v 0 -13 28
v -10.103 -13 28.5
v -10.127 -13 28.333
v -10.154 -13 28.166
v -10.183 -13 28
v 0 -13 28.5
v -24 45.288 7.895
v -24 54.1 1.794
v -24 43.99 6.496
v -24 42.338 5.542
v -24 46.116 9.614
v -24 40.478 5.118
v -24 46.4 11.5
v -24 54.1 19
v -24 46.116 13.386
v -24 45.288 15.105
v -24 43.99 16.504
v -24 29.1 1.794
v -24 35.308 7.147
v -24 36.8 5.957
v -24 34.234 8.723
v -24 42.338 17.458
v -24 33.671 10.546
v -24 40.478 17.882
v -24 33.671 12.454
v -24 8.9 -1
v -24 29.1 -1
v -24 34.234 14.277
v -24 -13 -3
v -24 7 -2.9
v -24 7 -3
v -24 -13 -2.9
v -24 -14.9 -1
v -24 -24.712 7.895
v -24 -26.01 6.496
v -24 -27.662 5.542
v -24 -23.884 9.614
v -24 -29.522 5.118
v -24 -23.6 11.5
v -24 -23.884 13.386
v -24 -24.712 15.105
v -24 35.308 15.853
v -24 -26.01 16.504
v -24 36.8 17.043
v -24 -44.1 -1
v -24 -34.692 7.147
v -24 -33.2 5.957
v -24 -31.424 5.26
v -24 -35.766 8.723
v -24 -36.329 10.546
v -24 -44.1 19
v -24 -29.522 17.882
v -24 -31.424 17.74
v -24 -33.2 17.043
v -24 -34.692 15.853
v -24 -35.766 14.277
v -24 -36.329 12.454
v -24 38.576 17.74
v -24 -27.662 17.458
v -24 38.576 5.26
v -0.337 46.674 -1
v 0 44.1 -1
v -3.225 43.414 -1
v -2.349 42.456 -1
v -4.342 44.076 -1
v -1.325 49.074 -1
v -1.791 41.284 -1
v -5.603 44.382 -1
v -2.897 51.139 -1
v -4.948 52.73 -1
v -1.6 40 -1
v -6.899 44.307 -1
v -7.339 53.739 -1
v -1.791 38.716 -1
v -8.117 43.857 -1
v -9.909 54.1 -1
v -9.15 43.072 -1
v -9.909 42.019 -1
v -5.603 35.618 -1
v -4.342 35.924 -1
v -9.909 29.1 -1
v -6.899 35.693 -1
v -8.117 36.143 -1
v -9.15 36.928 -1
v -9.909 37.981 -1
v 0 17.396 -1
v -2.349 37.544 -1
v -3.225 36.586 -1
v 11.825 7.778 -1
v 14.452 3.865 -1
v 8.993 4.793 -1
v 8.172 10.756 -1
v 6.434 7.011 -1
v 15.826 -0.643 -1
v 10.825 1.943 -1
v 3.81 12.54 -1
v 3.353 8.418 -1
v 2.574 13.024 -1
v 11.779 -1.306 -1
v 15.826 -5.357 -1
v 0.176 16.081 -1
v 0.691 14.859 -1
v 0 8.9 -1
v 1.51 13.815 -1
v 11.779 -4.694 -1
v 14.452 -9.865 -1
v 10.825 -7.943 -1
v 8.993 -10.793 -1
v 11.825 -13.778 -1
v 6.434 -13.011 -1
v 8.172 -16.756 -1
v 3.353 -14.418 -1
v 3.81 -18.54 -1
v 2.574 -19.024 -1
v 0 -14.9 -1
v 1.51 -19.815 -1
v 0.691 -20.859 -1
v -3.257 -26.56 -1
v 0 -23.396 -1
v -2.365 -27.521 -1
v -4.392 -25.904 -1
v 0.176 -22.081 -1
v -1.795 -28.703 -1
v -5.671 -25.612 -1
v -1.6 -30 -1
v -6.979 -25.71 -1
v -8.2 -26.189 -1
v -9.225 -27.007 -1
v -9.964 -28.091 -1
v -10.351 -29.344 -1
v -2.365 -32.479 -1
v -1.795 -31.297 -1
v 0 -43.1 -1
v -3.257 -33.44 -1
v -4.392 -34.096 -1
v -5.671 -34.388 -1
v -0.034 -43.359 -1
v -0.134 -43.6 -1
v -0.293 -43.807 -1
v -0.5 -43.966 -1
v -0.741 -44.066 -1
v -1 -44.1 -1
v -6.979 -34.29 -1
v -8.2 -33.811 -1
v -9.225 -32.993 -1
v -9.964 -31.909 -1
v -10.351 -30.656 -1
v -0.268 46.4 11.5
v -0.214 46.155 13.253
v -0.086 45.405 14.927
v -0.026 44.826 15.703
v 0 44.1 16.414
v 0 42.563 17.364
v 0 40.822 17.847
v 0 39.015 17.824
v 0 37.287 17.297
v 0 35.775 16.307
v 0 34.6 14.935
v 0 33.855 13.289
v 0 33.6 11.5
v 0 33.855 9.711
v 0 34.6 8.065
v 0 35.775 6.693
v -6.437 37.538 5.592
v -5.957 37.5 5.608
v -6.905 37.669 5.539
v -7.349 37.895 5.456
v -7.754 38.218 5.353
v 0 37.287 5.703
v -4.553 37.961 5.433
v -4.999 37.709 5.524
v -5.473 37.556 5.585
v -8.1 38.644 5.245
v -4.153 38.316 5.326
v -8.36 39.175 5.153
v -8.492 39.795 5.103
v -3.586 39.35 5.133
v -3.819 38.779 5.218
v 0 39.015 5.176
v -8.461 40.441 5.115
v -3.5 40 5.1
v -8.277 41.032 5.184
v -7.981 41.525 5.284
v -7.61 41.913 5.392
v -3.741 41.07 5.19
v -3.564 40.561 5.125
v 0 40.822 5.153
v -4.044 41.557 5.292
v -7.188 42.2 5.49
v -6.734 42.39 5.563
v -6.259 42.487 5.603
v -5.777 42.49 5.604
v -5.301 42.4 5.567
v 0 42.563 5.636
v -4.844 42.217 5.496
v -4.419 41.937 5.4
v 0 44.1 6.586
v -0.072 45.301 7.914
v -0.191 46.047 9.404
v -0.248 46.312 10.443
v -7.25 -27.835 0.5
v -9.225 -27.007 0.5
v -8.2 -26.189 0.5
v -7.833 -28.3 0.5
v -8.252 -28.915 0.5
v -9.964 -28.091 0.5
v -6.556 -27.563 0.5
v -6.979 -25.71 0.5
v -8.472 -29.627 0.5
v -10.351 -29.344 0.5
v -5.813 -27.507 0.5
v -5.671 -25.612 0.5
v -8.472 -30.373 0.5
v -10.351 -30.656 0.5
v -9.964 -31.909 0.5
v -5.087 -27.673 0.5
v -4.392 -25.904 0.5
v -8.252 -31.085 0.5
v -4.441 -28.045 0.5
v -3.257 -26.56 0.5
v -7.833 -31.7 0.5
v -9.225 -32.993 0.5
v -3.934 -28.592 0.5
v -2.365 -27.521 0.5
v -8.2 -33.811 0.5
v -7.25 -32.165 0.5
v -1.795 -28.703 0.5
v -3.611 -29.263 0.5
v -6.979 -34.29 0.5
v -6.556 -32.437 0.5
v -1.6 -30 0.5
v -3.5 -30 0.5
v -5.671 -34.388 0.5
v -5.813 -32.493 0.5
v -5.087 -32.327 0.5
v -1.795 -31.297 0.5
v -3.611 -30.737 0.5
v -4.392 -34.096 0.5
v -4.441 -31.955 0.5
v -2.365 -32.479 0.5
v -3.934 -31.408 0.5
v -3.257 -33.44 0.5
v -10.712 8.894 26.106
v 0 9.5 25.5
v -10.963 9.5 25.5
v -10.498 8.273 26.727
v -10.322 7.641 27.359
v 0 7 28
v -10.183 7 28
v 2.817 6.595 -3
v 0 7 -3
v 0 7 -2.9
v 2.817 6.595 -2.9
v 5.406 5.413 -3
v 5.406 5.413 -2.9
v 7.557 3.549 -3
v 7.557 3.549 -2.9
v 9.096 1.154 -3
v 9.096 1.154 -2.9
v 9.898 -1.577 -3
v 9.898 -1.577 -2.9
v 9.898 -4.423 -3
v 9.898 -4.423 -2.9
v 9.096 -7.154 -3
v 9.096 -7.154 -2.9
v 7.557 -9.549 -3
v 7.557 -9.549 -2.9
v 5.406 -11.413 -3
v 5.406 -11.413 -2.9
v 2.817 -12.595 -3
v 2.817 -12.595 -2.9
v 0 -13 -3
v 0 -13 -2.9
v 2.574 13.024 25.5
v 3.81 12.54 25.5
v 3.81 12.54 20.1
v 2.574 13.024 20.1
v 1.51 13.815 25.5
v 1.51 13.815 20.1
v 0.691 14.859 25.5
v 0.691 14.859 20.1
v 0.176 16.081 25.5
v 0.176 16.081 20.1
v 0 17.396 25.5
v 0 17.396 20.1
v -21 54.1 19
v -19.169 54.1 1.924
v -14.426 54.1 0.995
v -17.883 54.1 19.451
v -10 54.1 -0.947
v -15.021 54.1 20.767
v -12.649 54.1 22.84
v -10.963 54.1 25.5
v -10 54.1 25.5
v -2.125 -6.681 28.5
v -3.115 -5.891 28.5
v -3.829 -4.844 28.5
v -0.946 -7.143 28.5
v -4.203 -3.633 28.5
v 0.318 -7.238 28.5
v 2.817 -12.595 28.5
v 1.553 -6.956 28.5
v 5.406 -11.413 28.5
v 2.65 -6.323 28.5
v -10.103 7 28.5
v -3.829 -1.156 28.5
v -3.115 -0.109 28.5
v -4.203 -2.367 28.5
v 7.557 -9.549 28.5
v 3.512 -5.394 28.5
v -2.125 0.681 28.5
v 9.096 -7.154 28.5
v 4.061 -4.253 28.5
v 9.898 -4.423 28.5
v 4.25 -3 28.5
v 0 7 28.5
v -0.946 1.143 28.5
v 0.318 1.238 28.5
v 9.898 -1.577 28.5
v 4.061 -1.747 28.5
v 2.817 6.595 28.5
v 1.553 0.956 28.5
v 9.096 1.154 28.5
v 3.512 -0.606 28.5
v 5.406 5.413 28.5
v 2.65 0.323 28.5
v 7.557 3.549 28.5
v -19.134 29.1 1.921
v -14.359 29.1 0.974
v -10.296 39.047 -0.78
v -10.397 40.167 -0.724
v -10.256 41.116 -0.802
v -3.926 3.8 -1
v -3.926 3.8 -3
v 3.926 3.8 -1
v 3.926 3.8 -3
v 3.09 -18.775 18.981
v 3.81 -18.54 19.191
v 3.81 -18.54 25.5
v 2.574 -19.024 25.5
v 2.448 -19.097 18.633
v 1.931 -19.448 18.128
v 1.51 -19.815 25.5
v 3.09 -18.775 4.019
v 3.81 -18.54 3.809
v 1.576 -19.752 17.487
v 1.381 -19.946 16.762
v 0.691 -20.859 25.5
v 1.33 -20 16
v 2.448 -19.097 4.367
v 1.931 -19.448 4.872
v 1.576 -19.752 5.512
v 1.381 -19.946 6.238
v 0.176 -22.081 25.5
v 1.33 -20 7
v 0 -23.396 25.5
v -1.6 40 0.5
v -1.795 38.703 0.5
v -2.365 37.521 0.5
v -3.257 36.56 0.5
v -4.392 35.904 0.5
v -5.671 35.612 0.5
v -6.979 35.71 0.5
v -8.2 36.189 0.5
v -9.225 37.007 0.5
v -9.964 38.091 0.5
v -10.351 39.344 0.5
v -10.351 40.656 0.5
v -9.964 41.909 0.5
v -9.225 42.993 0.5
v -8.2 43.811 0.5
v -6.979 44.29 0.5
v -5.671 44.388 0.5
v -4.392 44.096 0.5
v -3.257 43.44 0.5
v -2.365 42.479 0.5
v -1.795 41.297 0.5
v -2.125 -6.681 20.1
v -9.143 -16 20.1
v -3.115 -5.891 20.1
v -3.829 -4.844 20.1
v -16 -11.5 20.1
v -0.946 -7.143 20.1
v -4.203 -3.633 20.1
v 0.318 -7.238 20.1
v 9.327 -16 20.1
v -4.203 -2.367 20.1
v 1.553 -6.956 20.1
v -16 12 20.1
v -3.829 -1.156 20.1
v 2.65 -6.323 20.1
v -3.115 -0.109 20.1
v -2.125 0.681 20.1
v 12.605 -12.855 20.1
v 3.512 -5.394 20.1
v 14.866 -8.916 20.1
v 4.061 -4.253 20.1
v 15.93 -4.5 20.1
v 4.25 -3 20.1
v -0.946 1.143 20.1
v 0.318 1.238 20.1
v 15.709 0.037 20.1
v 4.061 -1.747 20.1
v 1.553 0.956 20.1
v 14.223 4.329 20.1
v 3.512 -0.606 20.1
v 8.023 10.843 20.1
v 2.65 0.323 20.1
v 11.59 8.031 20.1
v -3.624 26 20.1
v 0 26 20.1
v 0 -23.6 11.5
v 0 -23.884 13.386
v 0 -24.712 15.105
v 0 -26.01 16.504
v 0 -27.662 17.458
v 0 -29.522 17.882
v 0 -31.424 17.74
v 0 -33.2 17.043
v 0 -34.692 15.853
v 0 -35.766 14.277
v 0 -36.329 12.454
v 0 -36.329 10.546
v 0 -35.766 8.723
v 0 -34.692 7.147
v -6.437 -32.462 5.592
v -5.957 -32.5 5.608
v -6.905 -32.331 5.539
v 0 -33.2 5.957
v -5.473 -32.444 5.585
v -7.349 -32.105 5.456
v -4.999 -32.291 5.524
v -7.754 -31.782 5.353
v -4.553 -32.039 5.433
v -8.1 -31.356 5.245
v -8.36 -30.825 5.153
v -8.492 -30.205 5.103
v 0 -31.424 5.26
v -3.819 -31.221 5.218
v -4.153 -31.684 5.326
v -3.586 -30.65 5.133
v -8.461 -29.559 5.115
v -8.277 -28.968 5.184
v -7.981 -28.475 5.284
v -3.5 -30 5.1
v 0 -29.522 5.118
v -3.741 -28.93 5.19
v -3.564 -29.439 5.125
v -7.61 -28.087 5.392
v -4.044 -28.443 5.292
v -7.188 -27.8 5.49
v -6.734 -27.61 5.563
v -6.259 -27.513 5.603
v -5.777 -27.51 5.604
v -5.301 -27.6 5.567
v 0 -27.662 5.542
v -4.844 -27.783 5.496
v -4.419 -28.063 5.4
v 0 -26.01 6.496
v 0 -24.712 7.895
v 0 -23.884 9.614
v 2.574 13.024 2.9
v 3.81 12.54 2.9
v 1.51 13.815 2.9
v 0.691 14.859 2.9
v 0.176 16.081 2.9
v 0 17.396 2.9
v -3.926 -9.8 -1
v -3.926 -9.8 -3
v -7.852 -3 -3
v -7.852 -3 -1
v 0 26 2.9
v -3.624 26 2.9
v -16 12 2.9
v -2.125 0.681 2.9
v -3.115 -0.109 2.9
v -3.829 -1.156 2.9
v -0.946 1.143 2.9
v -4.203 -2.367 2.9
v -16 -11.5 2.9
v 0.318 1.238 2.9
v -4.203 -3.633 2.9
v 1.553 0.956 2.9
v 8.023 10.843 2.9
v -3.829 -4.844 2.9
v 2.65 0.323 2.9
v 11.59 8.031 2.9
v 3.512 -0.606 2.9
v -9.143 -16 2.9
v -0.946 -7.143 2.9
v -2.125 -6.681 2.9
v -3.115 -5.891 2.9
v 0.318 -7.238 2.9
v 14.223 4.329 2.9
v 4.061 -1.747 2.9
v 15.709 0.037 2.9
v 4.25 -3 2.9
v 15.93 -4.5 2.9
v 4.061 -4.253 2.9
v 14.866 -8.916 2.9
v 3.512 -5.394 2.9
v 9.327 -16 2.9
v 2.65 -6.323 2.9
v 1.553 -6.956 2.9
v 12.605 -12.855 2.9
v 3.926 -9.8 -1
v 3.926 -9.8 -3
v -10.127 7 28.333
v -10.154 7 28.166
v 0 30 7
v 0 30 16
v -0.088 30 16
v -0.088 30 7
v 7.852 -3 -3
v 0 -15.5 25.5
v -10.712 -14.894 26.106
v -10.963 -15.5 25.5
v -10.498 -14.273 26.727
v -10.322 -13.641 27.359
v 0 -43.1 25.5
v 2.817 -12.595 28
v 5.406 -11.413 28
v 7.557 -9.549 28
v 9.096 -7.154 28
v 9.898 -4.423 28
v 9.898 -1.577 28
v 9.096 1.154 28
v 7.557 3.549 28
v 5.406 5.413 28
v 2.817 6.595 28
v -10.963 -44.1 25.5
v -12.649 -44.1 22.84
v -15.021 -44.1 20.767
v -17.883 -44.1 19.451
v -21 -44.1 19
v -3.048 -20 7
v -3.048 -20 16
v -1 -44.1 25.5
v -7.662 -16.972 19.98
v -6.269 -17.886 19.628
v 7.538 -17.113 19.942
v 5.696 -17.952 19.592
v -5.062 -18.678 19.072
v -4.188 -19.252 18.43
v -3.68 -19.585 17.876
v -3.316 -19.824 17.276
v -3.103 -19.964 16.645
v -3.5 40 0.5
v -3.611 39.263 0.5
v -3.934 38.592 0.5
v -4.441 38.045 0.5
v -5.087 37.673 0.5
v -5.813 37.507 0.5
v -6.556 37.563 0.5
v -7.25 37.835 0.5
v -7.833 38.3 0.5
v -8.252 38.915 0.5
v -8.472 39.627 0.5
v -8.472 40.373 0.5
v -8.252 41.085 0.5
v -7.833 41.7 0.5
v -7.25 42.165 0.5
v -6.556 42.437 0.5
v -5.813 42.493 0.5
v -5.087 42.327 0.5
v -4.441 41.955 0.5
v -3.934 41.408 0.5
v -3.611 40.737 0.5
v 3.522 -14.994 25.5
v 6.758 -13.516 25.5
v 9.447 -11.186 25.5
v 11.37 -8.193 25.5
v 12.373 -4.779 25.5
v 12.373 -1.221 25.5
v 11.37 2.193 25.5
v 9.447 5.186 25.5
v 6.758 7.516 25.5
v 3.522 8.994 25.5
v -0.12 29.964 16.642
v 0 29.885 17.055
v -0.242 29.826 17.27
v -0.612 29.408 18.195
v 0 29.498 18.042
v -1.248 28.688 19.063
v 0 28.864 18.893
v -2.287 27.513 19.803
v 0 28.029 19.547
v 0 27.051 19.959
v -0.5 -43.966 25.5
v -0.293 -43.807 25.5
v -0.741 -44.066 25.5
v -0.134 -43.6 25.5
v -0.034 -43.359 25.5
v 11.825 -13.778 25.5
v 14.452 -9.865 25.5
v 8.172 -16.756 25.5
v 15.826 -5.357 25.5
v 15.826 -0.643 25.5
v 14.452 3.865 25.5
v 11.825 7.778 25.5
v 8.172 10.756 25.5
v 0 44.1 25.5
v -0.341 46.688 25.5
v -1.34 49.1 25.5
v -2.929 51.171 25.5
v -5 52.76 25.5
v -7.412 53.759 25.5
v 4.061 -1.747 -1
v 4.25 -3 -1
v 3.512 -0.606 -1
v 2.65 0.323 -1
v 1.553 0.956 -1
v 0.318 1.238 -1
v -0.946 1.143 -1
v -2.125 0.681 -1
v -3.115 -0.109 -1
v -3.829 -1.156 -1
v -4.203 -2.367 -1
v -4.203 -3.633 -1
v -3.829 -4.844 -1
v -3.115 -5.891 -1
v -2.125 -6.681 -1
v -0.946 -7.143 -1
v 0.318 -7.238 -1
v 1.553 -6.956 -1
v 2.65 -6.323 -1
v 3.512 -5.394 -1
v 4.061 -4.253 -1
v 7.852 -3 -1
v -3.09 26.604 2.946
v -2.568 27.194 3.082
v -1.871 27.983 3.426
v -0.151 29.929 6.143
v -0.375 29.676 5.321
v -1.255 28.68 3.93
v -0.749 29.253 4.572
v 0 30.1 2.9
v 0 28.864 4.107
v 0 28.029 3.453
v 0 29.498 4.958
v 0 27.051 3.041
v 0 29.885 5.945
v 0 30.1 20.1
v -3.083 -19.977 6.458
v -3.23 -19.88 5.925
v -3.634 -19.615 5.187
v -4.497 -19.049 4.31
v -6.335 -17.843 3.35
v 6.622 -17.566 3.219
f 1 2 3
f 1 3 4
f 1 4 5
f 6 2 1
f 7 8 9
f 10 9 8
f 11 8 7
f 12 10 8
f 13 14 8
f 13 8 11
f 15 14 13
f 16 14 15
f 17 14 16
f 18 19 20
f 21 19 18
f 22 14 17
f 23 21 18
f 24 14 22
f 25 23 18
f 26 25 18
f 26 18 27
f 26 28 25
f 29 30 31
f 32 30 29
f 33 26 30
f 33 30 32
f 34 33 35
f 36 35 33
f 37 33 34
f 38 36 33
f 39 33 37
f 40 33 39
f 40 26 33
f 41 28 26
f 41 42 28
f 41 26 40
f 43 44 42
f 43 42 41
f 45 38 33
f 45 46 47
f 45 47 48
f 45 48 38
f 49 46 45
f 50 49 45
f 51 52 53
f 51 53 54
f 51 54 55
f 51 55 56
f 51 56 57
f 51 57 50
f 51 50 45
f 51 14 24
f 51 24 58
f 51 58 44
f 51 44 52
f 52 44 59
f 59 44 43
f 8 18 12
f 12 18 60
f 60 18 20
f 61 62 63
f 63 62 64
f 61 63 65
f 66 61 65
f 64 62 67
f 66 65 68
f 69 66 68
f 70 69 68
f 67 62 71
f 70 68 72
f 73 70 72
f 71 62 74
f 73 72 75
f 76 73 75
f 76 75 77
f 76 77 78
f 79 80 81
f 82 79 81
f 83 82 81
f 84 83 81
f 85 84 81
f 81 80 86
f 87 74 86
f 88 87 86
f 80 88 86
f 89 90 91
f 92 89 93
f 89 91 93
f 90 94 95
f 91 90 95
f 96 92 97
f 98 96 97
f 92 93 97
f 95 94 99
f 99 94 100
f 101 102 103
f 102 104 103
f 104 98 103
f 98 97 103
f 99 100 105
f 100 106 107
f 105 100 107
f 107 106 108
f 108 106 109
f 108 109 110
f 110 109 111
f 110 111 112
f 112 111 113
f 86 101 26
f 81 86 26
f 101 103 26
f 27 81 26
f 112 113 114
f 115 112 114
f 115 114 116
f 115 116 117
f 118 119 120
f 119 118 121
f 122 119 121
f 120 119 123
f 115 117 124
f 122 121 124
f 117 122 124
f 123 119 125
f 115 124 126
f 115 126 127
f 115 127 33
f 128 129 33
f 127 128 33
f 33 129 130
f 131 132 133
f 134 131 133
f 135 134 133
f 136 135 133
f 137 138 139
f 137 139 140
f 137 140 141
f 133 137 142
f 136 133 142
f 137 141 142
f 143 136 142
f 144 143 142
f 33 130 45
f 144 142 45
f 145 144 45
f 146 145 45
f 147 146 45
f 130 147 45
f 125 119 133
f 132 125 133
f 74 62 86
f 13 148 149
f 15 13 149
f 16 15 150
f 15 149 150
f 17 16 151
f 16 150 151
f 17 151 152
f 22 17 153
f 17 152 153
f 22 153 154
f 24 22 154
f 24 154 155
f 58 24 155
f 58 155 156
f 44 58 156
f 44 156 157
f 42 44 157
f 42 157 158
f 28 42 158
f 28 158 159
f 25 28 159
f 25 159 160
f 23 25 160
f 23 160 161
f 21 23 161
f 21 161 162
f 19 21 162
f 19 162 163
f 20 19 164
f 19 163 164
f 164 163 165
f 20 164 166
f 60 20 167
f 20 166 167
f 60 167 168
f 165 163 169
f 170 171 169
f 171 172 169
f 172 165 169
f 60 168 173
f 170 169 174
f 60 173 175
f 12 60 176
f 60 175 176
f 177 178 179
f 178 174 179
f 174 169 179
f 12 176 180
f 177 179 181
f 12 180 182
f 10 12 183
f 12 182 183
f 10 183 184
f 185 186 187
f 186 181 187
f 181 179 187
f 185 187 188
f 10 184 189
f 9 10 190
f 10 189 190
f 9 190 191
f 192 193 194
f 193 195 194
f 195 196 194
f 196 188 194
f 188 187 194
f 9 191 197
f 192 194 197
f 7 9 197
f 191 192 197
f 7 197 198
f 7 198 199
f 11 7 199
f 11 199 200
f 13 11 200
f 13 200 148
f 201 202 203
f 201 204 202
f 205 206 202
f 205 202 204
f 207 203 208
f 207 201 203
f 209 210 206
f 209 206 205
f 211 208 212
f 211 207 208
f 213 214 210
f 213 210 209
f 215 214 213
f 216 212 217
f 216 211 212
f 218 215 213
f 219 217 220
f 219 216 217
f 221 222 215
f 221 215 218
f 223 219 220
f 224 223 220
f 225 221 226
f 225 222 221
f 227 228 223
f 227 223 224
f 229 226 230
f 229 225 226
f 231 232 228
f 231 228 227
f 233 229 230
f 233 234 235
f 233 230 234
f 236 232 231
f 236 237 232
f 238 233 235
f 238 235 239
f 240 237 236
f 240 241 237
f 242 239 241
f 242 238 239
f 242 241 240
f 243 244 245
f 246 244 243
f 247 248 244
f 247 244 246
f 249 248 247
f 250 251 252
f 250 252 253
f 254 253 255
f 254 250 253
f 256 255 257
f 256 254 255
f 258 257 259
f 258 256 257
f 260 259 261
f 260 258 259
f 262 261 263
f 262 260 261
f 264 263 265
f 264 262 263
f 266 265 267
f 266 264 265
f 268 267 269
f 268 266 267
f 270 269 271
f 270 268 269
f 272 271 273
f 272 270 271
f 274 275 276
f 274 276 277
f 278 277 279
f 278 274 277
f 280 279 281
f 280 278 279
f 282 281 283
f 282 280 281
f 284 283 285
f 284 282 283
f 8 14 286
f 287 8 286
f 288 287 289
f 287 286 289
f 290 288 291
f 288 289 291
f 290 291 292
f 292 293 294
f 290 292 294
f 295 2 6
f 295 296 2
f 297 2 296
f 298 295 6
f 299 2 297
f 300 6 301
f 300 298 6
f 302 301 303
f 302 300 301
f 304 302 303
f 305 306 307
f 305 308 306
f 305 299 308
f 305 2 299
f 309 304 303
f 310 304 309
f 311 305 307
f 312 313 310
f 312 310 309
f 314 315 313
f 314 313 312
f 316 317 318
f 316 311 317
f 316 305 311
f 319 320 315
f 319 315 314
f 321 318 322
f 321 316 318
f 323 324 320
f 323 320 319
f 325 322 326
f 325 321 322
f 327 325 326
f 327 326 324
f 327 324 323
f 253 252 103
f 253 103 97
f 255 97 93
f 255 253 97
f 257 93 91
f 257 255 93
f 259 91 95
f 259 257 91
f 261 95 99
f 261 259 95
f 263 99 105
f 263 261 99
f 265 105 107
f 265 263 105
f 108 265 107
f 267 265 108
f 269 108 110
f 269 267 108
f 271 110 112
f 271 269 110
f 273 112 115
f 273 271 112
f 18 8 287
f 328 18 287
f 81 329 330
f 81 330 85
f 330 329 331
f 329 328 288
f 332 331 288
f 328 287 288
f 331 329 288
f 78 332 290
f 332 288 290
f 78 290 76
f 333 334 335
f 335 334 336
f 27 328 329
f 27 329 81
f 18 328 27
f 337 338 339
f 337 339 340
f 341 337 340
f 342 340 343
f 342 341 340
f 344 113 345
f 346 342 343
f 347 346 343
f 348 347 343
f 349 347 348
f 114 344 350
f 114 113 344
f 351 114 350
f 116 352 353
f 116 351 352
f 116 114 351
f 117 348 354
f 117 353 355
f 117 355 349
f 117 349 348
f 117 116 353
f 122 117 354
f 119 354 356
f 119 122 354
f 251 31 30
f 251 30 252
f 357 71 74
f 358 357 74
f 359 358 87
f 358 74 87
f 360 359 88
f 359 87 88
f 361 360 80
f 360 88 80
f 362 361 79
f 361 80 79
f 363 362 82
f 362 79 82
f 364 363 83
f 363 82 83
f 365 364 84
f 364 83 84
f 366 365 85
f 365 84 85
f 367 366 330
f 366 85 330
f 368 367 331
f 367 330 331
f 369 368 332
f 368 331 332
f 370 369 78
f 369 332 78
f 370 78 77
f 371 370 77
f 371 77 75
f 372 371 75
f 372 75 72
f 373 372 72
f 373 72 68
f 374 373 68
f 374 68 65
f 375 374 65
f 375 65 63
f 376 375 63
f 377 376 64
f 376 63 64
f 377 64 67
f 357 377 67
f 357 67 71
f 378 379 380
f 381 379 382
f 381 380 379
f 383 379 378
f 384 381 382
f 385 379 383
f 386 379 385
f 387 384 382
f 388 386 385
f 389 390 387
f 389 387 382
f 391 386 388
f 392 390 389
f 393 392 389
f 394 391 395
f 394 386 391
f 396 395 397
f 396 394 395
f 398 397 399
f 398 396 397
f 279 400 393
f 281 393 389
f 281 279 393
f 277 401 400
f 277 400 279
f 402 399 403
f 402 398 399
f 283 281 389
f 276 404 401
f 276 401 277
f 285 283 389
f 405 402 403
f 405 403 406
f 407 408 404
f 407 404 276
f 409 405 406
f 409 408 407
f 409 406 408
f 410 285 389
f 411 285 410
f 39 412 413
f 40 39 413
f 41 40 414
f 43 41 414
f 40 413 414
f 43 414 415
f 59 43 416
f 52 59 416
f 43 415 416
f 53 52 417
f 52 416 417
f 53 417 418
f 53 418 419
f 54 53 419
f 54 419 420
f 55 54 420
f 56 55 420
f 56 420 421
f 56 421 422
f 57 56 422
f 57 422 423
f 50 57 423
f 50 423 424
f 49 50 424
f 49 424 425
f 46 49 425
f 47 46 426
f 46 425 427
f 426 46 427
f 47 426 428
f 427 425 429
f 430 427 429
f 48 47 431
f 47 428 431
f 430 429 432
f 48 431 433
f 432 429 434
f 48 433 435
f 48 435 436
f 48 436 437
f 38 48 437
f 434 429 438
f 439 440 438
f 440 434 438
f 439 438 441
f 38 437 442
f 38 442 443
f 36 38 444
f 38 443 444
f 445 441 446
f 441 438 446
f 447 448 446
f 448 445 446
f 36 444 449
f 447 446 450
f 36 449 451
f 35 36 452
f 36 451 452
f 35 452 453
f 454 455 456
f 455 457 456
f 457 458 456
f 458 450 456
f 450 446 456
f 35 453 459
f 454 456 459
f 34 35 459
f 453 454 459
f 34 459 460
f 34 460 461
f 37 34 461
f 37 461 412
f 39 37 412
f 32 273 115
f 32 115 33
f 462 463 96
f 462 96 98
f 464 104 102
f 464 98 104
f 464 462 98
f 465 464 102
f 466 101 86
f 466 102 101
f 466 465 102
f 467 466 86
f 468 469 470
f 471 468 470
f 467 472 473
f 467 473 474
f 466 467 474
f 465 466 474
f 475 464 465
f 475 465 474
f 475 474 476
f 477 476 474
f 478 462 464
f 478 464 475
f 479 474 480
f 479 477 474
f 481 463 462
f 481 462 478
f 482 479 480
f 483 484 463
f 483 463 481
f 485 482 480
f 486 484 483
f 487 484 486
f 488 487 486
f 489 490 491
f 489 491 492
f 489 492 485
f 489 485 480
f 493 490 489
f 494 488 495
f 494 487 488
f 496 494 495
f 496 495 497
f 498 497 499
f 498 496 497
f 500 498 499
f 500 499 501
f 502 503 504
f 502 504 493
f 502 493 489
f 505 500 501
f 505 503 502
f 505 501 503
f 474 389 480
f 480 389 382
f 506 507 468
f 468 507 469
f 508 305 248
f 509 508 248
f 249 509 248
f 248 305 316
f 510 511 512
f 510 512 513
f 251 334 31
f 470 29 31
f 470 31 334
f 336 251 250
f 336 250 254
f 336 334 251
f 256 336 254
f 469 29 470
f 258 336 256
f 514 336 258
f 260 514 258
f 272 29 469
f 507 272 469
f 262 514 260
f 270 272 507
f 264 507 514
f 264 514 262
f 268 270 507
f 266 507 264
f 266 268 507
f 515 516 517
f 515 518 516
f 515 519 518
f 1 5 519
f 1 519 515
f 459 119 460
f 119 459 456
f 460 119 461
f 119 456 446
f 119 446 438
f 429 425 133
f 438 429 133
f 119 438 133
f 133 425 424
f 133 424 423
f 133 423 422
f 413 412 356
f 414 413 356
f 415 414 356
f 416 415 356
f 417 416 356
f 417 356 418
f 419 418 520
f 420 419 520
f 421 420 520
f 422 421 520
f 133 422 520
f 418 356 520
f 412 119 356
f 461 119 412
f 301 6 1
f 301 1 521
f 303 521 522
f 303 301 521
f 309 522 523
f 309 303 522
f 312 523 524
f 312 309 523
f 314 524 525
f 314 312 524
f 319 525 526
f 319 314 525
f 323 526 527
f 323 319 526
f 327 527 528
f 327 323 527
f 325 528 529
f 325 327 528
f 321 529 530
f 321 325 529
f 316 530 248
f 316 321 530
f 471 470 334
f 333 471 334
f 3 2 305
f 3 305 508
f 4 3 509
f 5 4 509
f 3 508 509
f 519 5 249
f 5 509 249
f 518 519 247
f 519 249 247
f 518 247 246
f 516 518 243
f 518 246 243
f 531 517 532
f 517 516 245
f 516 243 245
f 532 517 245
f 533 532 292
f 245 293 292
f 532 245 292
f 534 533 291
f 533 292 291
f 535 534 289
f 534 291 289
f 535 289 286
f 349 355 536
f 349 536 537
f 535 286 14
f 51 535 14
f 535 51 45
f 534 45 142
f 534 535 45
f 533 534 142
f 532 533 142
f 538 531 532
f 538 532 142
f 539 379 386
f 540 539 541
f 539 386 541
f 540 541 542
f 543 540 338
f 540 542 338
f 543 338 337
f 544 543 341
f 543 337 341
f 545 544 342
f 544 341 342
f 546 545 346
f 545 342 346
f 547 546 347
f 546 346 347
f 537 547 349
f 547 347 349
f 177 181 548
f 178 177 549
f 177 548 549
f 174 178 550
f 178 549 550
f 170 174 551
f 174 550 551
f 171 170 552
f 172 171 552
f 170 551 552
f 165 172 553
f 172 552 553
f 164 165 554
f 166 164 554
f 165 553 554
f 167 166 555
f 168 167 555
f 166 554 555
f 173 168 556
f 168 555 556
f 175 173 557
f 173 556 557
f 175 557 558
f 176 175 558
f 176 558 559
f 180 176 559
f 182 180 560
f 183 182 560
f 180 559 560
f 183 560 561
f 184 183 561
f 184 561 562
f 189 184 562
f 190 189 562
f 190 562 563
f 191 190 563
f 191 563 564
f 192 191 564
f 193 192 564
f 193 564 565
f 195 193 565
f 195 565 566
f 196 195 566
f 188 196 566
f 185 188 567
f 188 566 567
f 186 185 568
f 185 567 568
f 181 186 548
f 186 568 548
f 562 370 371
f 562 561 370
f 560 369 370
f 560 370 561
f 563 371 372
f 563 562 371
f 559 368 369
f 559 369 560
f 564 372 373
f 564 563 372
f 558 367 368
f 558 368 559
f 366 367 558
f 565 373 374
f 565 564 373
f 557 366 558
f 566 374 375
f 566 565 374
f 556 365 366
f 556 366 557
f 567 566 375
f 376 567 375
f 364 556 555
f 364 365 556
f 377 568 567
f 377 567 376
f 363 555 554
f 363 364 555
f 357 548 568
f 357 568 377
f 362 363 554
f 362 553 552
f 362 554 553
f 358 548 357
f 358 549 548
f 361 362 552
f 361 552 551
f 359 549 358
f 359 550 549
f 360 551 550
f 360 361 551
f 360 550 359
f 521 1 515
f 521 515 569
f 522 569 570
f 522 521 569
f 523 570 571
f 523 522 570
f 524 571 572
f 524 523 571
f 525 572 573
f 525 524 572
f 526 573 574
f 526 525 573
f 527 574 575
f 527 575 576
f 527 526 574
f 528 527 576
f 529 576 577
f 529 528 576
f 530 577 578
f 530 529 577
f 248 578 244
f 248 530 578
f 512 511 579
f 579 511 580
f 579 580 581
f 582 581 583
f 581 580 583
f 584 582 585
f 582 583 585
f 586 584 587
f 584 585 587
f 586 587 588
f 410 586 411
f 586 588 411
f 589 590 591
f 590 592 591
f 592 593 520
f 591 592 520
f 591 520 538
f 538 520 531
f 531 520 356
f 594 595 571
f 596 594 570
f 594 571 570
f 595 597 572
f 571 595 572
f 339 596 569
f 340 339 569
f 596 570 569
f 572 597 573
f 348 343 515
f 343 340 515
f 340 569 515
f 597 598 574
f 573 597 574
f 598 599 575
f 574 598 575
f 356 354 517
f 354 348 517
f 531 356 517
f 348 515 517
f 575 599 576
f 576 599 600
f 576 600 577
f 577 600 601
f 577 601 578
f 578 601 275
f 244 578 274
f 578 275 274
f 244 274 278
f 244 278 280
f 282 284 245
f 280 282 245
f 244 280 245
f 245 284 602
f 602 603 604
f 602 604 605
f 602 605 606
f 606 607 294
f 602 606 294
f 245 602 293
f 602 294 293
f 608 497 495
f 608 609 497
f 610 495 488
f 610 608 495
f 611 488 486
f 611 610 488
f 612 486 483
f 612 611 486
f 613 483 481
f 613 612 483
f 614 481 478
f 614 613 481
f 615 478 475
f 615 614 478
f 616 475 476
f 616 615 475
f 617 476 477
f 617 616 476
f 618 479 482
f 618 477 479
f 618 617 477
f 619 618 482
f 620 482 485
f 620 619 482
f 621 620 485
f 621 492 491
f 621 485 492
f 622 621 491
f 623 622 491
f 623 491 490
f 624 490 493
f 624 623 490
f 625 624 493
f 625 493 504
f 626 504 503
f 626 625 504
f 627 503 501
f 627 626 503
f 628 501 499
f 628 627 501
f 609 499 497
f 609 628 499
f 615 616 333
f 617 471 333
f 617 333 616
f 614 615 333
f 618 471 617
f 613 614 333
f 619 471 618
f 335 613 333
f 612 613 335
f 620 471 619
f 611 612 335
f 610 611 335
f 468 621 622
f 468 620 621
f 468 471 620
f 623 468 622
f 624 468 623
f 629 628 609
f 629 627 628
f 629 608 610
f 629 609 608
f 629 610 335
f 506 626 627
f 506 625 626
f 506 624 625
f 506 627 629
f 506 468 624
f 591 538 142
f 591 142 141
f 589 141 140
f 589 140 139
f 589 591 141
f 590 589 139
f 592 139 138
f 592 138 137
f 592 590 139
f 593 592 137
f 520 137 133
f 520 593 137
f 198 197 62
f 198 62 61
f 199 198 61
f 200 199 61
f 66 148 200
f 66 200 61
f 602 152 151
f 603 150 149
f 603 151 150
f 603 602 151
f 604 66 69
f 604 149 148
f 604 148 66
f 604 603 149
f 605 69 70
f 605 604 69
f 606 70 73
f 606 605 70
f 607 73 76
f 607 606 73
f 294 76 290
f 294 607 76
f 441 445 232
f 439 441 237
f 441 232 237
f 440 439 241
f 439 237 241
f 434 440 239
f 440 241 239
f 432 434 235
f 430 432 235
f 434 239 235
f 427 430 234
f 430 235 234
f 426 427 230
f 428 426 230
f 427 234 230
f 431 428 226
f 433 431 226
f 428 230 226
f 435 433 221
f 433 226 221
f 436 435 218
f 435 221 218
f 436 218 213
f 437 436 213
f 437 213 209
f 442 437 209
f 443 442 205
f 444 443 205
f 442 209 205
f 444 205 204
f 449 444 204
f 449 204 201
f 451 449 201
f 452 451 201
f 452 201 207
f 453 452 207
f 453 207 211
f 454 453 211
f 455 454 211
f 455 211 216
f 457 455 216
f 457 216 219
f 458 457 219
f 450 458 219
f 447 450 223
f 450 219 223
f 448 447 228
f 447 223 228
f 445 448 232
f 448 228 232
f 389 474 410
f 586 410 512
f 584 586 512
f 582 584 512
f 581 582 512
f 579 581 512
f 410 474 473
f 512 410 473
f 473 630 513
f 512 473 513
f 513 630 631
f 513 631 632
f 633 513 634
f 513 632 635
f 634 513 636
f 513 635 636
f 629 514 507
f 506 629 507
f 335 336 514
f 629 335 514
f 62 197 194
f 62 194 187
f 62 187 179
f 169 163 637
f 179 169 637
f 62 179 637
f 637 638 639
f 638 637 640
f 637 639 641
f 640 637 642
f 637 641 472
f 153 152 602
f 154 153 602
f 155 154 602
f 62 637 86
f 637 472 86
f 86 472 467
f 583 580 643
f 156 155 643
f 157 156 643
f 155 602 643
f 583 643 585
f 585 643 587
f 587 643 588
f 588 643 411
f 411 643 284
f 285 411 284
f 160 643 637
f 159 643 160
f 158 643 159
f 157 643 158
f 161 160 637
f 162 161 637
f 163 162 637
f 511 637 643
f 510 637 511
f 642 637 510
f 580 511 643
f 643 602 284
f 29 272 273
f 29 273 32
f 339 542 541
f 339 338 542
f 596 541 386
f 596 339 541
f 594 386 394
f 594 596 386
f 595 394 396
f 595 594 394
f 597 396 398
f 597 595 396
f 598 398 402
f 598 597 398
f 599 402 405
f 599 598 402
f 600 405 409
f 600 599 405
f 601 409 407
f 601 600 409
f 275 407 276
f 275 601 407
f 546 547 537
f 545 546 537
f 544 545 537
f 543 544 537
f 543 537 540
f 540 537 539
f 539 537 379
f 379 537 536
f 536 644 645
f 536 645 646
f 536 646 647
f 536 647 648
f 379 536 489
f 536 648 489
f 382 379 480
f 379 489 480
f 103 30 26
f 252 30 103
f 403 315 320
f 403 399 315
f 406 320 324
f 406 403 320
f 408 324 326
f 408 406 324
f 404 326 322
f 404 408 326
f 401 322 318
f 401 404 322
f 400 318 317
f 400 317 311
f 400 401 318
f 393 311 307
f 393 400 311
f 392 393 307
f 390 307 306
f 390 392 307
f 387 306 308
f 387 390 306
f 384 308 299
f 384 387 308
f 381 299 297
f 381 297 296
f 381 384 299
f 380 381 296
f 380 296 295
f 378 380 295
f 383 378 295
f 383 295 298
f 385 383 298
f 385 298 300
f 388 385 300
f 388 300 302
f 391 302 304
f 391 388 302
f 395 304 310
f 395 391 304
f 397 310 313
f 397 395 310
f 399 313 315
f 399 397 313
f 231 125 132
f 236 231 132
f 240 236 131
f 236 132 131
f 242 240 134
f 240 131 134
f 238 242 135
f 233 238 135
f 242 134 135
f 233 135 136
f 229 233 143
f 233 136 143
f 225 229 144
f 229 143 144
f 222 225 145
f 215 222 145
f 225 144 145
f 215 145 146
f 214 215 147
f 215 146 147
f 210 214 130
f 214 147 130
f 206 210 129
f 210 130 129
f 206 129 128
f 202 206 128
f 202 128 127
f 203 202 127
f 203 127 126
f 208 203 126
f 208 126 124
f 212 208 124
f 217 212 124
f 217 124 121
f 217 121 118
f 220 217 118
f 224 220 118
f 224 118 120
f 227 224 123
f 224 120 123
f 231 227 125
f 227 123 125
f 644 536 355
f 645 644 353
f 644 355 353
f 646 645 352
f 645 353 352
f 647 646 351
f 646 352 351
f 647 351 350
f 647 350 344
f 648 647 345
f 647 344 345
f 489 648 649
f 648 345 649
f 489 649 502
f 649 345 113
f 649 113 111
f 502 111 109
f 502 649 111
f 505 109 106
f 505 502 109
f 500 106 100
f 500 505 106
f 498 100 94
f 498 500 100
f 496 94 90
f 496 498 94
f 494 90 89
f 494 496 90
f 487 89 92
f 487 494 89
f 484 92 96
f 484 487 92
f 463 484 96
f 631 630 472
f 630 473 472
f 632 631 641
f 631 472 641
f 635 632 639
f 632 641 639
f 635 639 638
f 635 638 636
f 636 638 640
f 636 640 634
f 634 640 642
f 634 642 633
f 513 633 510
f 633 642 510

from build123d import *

# Parameters (mm, degrees)
SKETCH_R          = 4.25
PAD_DEPTH         = 28.5
PAD_DEPTH_BACK    = 5
FILLET_R          = 5
SKETCH002_R       = 6.4
POCKET_DEPTH      = 24.001
POCKET_DEPTH_BACK = -16.001
POCKET001_DEPTH   = 3
POCKET002_DEPTH   = 4
POCKET003_DEPTH   = 98.201
POCKET004_DEPTH   = 4
POCKET005_DEPTH   = 16
SKETCH028_R       = 22
POCKET006_DEPTH   = 25
SKETCH031_R       = 2.5
POCKET007_DEPTH   = 9
PAD001_DEPTH      = 17.2
SKETCH034_W       = 50
SKETCH034_H       = 25
POCKET008_DEPTH   = 2
SKETCH036_R       = 4.4
POCKET009_DEPTH   = 1.5
CHAMFER_SIZE      = 1.9
CHAMFER001_SIZE   = 2.5


with BuildPart() as part:
    # Sketch → Pad (new body, two sides)
    with BuildSketch(Plane.XY) as pad_sk:
        with BuildLine():
            ThreePointArc((0, -19), (16, -3), (0, 13))
            Line((0, 44.1), (0, 13))
            ThreePointArc((0, 44.1), (-2.928932, 51.171068), (-10, 54.1))
            Line((-24, 54.1), (-10, 54.1))
            Line((-24, 54.1), (-24, -44.1))
            Line((-24, -44.1), (-1, -44.1))
            ThreePointArc((-1, -44.1), (-0.292893, -43.807107), (0, -43.1))
            Line((0, -19), (0, -43.1))
        make_face()
        with Locations((0, -3)):
            Circle(SKETCH_R, mode=Mode.SUBTRACT)
    extrude(amount=PAD_DEPTH)
    extrude(pad_sk.sketch, amount=-PAD_DEPTH_BACK)

    # Fillet
    fillet_edges = [part.edges().sort_by_distance(p)[0] for p in [
        (0, 13, 11.75),
        (0, -19, 11.75),
    ]]
    fillet(fillet_edges, radius=FILLET_R)

    # Sketch002 → Pocket (cut, two sides)
    with BuildSketch(Plane.YZ) as pocket_sk:
        with Locations((-30, 11.5)):
            Circle(SKETCH002_R)
        with Locations((40, 11.5)):
            Circle(SKETCH002_R)
    extrude(amount=-POCKET_DEPTH, mode=Mode.SUBTRACT)
    extrude(pocket_sk.sketch, amount=-POCKET_DEPTH_BACK, mode=Mode.SUBTRACT)

    # Sketch013 → Pocket001 (cut)
    with BuildSketch(Plane.XY.offset(28.5)):
        with BuildLine():
            ThreePointArc((0, -13), (10, -3), (0, 7))
            Line((-40, 7), (0, 7))
            Line((-40, 7), (-40, 60))
            Line((-40, 60), (30, 60))
            Line((30, 60), (30, -60))
            Line((30, -60), (-40, -60))
            Line((-40, -60), (-40, -13))
            Line((-40, -13), (0, -13))
        make_face()
    extrude(amount=-POCKET001_DEPTH, mode=Mode.SUBTRACT)

    # Sketch024 → Pocket002 (cut)
    with BuildSketch(Plane(origin=(0, 0, -5), x_dir=(1, 0, 0), z_dir=(0, 0, -1))):
        with BuildLine():
            Line((0, 13), (-40, 13))
            Line((-40, 13), (-40, 65))
            Line((-40, 65), (24, 65))
            Line((24, 65), (24, -65))
            Line((24, -65), (-40, -65))
            Line((-40, -7), (-40, -65))
            Line((-40, -7), (0, -7))
            ThreePointArc((0, -7), (10, 3), (0, 13))
        make_face()
    extrude(amount=-POCKET002_DEPTH, mode=Mode.SUBTRACT)

    # Sketch029 → Pocket003 (cut, through all)
    with BuildSketch(Plane(origin=(0, 54.1, 0), x_dir=(-1, 0, 0), z_dir=(0, 1, 0))):
        with BuildLine():
            ThreePointArc((32, 30), (13.221825, 37.778175), (21, 19))
            Line((21, 19), (32, 19))
            Line((32, 30), (32, 19))
        make_face()
    extrude(amount=-POCKET003_DEPTH, mode=Mode.SUBTRACT)

    # Sketch027 → Pocket004 (cut)
    with BuildSketch(Plane(origin=(0, 0, -5), x_dir=(1, 0, 0), z_dir=(0, 0, -1))):
        Polygon((3.925982, 9.8), (-3.925982, 9.8), (-7.851964, 3), (-3.925982, -3.8), (3.925982, -3.8), (7.851964, 3), align=None)
    extrude(amount=-POCKET004_DEPTH, mode=Mode.SUBTRACT)

    # Sketch025 → Pocket005 (cut, symmetric)
    with BuildSketch(Plane.YZ):
        with BuildLine():
            Line((-16, 20.1), (26, 20.1))
            ThreePointArc((30, 16), (28.864001, 18.892928), (26, 20.1))
            Line((30, 16), (30, 7))
            ThreePointArc((26, 2.9), (28.864001, 4.107072), (30, 7))
            Line((26, 2.9), (-16, 2.9))
            ThreePointArc((-20, 7), (-18.864001, 4.107072), (-16, 2.9))
            Line((-20, 7), (-20, 16))
            ThreePointArc((-16, 20.1), (-18.864001, 18.892928), (-20, 16))
        make_face()
    extrude(amount=POCKET005_DEPTH, both=True, mode=Mode.SUBTRACT)

    # Sketch028 → Pocket006 (cut)
    with BuildSketch(Plane(origin=(0, 54.1, 0), x_dir=(-1, 0, 0), z_dir=(0, 1, 0))):
        with Locations((21, -20)):
            Circle(SKETCH028_R)
    extrude(amount=-POCKET006_DEPTH, mode=Mode.SUBTRACT)

    # Sketch031 → Pocket007 (cut)
    with BuildSketch(Plane(origin=(0, 0, -1), x_dir=(1, 0, 0), z_dir=(0, 0, -1))):
        with Locations((-6, 30)):
            Circle(SKETCH031_R)
        with Locations((-6, -40)):
            Circle(SKETCH031_R)
    extrude(amount=-POCKET007_DEPTH, mode=Mode.SUBTRACT)

    # Sketch032 → Pad001 (new body)
    with BuildSketch(Plane.XY.offset(2.9)):
        Polygon((0, -22), (-16, -11.5), (-16, -22), align=None)
        Polygon((-16, 12), (0, 30.1), (-16, 30.1), align=None)
    extrude(amount=PAD001_DEPTH)

    # Sketch034 → Pocket008 (cut)
    with BuildSketch(Plane(origin=(0, 0, -5), x_dir=(1, 0, 0), z_dir=(0, 0, -1))):
        with Locations((-10, 2.5)):
            Rectangle(SKETCH034_W, SKETCH034_H)
    extrude(amount=-POCKET008_DEPTH, mode=Mode.SUBTRACT)

    # Sketch036 → Pocket009 (cut)
    with BuildSketch(Plane(origin=(0, 0, -1), x_dir=(1, 0, 0), z_dir=(0, 0, -1))):
        with Locations((-6, 30)):
            Circle(SKETCH036_R)
        with Locations((-6, -40)):
            Circle(SKETCH036_R)
    extrude(amount=-POCKET009_DEPTH, mode=Mode.SUBTRACT)

    # Chamfer
    chamfer_edges = [part.edges().sort_by_distance(p)[0] for p in [
        (-12, -13, -1),
        (-12, 7, -1),
        (10, -3, -1),
    ]]
    chamfer(chamfer_edges, length=CHAMFER_SIZE)

    # Chamfer001
    chamfer001_edges = [part.edges().sort_by_distance(p)[0] for p in [
        (10, -3, 25.5),
        (-5.481285, -13, 25.5),
        (-5.481285, 7, 25.5),
    ]]
    chamfer(chamfer001_edges, length=CHAMFER001_SIZE)


solid = part.part
